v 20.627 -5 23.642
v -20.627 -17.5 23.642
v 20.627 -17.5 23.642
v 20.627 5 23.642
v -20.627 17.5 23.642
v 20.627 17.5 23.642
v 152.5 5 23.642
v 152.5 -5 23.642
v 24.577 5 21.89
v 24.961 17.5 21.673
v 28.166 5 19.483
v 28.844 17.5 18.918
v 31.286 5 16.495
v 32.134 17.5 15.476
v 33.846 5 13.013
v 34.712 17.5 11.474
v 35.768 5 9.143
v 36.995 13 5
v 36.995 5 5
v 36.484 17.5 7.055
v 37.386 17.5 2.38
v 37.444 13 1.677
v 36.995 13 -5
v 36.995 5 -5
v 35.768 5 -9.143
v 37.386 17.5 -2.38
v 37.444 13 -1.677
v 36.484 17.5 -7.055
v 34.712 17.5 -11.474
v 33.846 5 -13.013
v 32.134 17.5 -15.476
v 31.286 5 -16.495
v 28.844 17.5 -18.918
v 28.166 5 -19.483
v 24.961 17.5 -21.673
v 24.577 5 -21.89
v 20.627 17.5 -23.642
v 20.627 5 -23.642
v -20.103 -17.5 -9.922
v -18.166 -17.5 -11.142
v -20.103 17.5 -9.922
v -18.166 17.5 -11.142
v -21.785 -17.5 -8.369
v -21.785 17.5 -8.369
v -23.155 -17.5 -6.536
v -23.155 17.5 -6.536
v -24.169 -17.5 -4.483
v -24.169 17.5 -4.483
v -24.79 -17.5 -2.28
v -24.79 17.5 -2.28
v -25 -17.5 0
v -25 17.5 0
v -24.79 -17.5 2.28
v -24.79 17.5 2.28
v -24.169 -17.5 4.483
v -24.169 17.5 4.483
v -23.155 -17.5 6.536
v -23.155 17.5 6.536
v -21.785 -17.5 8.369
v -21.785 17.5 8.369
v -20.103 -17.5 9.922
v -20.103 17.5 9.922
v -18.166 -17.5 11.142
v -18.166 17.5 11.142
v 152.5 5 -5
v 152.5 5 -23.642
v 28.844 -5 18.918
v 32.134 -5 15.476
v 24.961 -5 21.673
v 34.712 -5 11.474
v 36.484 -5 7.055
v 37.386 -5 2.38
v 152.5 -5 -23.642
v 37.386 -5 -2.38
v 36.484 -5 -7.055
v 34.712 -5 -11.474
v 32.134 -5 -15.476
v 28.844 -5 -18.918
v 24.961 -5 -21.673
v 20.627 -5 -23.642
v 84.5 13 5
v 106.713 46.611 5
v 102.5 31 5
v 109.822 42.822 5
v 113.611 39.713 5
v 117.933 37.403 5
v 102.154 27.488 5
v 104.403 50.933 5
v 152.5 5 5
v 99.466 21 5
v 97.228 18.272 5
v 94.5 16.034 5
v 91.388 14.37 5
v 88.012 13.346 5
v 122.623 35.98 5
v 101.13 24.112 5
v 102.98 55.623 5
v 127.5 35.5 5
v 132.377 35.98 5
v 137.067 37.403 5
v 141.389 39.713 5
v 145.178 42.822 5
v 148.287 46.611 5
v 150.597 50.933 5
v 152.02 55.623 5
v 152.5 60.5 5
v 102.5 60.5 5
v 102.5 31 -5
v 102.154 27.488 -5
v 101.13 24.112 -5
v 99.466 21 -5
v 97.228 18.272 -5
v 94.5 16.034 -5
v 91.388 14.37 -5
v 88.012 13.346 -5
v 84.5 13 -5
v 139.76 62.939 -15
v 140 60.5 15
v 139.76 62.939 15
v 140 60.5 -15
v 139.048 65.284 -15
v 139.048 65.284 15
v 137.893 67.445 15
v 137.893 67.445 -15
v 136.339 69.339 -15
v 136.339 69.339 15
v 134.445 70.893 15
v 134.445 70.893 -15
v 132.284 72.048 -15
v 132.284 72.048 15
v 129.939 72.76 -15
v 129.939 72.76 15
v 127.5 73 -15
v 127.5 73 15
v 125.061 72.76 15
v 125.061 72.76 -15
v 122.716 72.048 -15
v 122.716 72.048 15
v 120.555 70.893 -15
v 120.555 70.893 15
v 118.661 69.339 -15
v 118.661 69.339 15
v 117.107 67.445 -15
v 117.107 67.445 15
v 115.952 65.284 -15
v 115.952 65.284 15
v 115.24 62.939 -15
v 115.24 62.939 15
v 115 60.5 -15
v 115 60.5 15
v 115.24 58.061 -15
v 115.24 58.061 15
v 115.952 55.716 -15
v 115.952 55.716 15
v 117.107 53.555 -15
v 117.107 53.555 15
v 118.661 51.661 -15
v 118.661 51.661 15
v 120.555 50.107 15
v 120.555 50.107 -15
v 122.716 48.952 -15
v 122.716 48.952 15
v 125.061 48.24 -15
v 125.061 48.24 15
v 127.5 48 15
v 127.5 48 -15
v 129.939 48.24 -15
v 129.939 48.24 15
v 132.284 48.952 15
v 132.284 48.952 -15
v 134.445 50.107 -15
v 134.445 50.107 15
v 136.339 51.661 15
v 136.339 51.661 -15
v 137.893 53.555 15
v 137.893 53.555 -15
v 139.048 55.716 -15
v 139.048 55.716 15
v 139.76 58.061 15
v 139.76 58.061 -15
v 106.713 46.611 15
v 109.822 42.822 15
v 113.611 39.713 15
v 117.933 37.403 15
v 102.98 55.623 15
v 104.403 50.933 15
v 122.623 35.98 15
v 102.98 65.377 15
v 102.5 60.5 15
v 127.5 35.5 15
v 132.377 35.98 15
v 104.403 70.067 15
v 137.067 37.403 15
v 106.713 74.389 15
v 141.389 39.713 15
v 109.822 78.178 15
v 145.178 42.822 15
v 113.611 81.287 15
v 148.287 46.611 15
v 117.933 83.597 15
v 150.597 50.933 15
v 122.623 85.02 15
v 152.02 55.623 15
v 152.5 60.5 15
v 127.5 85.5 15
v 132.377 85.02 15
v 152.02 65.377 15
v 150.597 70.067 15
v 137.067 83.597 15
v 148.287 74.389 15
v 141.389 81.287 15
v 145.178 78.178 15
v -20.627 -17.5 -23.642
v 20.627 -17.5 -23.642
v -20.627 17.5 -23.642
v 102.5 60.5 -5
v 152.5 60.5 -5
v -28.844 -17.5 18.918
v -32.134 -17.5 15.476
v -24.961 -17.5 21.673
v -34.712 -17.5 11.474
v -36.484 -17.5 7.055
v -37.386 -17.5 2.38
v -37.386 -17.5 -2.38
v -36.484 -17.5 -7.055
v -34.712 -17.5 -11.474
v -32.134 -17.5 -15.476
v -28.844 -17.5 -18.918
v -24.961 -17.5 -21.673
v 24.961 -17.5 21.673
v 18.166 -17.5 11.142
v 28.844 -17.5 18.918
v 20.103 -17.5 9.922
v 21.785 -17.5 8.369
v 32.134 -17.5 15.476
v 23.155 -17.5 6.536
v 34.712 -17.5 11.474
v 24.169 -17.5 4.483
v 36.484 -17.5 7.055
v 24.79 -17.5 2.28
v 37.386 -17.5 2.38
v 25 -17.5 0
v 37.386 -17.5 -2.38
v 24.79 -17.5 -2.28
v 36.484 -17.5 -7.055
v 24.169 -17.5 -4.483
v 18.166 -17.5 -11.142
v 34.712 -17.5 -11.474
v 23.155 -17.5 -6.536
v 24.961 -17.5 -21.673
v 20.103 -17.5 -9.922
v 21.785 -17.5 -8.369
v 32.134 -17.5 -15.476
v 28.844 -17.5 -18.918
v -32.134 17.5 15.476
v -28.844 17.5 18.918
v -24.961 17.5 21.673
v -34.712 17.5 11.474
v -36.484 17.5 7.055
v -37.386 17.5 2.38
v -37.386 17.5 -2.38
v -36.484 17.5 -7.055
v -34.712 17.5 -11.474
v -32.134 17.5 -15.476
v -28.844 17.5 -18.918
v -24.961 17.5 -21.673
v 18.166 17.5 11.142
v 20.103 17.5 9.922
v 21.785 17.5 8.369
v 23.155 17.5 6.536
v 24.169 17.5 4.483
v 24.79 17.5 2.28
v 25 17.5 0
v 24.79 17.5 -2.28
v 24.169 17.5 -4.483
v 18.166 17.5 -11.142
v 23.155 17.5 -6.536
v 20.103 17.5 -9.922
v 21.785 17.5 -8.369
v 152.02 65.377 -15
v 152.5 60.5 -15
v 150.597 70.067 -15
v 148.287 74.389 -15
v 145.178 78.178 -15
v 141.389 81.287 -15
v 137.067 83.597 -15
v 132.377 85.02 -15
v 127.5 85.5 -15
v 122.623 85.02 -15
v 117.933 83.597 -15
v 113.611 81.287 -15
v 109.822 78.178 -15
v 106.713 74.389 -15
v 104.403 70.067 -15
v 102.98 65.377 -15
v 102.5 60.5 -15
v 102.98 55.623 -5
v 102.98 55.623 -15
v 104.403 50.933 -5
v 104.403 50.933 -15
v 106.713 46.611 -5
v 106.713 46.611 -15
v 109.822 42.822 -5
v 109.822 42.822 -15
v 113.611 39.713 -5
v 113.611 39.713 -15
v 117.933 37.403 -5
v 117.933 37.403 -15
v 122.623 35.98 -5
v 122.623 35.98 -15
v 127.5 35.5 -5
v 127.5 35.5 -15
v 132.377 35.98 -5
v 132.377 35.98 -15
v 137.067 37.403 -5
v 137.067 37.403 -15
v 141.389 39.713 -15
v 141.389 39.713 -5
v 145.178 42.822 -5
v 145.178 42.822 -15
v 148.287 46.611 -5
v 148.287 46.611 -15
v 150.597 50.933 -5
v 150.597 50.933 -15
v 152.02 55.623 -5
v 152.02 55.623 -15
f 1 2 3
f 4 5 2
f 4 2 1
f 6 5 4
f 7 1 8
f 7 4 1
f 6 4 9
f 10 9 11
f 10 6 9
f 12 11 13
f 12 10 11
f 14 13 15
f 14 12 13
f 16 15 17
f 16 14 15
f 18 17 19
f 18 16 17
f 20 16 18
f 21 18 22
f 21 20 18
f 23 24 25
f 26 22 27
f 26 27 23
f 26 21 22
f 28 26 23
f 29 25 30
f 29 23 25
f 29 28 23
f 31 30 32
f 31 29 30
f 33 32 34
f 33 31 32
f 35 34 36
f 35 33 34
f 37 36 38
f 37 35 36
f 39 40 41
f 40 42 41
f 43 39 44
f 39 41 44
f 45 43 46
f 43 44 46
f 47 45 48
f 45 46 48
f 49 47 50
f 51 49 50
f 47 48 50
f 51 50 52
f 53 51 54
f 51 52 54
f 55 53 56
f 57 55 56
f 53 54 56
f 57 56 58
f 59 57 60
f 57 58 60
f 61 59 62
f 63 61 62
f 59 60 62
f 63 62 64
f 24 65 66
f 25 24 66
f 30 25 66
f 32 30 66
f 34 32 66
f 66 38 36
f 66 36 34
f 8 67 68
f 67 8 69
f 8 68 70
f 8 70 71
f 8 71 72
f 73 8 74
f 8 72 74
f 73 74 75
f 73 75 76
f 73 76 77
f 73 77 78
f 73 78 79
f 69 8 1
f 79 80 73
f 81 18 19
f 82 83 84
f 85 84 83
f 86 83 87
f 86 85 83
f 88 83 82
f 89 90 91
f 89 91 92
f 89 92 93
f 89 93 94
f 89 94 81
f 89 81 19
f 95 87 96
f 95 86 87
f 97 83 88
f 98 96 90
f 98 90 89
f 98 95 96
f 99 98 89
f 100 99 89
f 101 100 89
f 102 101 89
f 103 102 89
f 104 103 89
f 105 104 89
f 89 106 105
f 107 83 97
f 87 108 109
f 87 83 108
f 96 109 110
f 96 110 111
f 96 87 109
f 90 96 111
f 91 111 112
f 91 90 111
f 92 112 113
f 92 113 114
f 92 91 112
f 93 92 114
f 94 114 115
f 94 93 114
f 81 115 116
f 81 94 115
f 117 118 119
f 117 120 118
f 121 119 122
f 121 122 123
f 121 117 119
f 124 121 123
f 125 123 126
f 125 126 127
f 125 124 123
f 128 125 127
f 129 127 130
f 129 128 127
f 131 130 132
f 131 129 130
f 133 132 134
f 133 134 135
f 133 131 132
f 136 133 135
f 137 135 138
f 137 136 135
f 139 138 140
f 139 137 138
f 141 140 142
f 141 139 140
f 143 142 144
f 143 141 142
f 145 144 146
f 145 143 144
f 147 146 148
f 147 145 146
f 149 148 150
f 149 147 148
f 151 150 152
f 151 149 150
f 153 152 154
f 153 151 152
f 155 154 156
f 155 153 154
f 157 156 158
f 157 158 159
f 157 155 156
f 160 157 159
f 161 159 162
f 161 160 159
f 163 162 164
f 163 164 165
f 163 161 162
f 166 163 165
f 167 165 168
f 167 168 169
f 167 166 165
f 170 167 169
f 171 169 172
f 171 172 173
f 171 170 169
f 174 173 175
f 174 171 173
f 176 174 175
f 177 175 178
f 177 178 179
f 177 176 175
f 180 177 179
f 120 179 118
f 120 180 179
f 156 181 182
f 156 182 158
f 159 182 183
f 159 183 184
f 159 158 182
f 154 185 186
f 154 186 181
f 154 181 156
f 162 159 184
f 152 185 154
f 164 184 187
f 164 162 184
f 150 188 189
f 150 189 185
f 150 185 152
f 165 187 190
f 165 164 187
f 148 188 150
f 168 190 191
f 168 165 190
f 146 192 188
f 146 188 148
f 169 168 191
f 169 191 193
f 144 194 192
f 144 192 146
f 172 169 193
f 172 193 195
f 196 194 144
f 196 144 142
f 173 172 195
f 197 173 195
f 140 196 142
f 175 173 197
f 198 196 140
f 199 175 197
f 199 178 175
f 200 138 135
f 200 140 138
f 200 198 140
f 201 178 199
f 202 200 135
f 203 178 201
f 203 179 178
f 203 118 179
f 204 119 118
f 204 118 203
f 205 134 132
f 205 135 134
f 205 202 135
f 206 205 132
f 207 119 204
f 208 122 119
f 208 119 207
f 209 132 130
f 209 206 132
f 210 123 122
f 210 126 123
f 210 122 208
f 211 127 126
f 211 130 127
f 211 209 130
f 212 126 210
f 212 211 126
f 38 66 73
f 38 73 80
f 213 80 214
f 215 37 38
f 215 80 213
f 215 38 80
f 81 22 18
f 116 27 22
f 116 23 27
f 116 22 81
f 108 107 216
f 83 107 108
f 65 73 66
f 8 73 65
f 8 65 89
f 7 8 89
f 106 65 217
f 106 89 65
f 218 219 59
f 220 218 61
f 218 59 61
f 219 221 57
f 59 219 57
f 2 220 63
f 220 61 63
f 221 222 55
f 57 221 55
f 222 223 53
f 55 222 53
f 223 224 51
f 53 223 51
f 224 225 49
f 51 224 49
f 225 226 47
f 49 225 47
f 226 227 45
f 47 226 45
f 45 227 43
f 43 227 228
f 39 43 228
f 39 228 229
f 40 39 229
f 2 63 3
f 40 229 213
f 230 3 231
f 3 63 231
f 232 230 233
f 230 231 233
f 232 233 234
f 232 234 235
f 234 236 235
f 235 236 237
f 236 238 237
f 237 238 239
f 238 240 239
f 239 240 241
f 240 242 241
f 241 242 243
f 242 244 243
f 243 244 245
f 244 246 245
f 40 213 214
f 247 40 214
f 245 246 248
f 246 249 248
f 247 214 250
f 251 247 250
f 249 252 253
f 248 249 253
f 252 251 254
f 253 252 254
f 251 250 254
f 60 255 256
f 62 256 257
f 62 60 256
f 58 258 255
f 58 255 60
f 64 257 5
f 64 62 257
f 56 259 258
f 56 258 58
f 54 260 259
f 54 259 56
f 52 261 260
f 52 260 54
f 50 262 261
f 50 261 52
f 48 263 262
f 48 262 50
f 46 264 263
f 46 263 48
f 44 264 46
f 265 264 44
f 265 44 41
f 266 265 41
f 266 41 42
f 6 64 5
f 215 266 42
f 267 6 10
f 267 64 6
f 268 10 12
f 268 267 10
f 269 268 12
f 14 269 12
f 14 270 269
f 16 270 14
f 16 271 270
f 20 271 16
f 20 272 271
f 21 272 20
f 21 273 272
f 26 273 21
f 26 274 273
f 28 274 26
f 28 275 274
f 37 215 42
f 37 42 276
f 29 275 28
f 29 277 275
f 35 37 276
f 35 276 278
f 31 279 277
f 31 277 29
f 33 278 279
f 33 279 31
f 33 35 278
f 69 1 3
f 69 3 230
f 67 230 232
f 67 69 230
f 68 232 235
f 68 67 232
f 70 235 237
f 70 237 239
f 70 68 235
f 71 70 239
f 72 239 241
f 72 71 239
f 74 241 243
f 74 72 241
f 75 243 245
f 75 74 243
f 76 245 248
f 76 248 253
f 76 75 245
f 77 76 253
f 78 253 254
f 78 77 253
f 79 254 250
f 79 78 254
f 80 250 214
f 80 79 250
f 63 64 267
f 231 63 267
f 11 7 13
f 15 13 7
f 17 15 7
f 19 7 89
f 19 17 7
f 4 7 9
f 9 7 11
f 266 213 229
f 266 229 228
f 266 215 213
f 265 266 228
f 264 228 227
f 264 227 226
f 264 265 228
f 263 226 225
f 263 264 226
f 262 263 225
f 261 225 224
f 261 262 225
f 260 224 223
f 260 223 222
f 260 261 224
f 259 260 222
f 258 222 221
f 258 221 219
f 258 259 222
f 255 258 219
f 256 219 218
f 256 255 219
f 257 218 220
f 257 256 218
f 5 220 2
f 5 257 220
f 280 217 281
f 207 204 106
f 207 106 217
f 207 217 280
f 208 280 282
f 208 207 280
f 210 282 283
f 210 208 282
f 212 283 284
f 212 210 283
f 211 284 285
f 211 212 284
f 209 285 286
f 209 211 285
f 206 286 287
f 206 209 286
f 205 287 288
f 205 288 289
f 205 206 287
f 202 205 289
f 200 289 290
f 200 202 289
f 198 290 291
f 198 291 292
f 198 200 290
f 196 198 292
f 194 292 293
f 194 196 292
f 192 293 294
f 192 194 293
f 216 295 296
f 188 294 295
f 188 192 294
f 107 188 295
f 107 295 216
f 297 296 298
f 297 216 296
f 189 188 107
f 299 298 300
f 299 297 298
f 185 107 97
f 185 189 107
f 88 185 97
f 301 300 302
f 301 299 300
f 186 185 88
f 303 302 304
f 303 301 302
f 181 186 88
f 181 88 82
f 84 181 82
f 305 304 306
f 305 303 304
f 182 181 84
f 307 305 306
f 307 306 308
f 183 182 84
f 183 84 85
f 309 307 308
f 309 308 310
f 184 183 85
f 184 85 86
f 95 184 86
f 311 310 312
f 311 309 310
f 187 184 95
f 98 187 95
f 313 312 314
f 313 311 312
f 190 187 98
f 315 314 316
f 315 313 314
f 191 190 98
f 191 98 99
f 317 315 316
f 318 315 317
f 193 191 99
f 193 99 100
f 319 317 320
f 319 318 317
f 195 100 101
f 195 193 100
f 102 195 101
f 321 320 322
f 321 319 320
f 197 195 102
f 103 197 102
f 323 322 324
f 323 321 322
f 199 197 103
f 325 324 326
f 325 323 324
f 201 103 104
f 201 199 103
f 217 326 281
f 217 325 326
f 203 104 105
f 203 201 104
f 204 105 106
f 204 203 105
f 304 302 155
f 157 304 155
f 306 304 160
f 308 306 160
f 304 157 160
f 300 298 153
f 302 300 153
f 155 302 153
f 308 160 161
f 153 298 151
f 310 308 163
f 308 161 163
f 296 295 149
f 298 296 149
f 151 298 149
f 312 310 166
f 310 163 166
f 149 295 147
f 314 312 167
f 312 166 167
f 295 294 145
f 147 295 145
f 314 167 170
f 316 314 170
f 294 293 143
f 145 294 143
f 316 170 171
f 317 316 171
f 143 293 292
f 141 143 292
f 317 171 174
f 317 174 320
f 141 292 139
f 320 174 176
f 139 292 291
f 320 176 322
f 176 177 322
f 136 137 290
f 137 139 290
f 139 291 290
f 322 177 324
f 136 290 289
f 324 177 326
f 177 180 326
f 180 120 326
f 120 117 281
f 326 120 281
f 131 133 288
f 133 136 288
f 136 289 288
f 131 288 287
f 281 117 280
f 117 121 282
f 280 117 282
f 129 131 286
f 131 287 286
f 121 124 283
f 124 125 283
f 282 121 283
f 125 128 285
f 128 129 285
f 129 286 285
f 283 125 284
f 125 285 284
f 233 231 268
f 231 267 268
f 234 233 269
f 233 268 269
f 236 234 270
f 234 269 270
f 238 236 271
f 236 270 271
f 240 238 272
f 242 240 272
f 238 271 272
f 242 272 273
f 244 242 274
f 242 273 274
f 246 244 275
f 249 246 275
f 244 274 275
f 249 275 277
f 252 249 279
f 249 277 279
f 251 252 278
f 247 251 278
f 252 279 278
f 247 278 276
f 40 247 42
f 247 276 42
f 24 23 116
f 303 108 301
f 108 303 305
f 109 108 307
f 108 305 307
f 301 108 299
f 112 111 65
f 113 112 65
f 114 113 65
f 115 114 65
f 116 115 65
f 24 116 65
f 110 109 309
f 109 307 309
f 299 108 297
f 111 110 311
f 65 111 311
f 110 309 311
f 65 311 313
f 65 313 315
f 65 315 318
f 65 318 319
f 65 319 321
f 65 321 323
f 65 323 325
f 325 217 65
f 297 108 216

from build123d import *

# Parameters (mm, degrees)
BOSS_EXTRUDE1_DEPTH = 17.5
SKETCH3_W           = 47.284329966
SKETCH3_H           = 10
BOSS_EXTRUDE2_DEPTH = 152.5
CUT_EXTRUDE1_DEPTH  = 152.5
SKETCH5_R           = 25
SKETCH5_R_2         = 12.5
BOSS_EXTRUDE3_DEPTH = 15
BOSS_EXTRUDE4_DEPTH = 5
RIB1_REACH          = 178.424
SKETCH7_WALL_W      = 419.848137108
SKETCH7_WALL_H      = 10
FILLET1_R           = 18


with BuildPart() as part:
    # Sketch2 → Boss-Extrude1 (new, symmetric)
    with BuildSketch(Plane(origin=(0, 0, 0), x_dir=(1, 0, 0), z_dir=(0, 1, 0))):
        with BuildLine():
            Line((-20.626994213, -23.642164983), (20.626994213, -23.642164983))
            ThreePointArc((20.626994213, -23.642164983), (37.5, 0), (20.626994213, 23.642164983))
            Line((20.626994213, 23.642164983), (-20.626994213, 23.642164983))
            ThreePointArc((-20.626994213, 23.642164983), (-37.5, 0), (-20.626994213, -23.642164983))
        make_face()
        with BuildLine():
            Line((-18.165876764, -11.142164983), (18.165876764, -11.142164983))
            ThreePointArc((18.165876764, -11.142164983), (25, 0), (18.165876764, 11.142164983))
            Line((18.165876764, 11.142164983), (-18.165876764, 11.142164983))
            ThreePointArc((-18.165876764, 11.142164983), (-25, 0), (-18.165876764, -11.142164983))
        make_face(mode=Mode.SUBTRACT)
    extrude(amount=BOSS_EXTRUDE1_DEPTH, both=True)

    # Sketch3 → Boss-Extrude2 (add)
    with BuildSketch(Plane(origin=(0, 0, 0), x_dir=(0, 0, -1), z_dir=(1, 0, 0))):
        Rectangle(SKETCH3_W, SKETCH3_H)
    extrude(amount=BOSS_EXTRUDE2_DEPTH)

    # Sketch4 → Cut-Extrude1 (cut)
    with BuildSketch(Plane(origin=(0, 17.5, 0), x_dir=(1, 0, 0), z_dir=(0, 1, 0))):
        with BuildLine():
            Line((-18.165876764, -11.142164983), (18.165876764, -11.142164983))
            ThreePointArc((18.165876764, -11.142164983), (25, 0), (18.165876764, 11.142164983))
            Line((18.165876764, 11.142164983), (-18.165876764, 11.142164983))
            ThreePointArc((-18.165876764, 11.142164983), (-25, 0), (-18.165876764, -11.142164983))
        make_face()
    extrude(amount=-CUT_EXTRUDE1_DEPTH, mode=Mode.SUBTRACT)



with BuildPart() as body_2:
    # Sketch5 → Boss-Extrude3 (new, symmetric)
    with BuildSketch(Plane.XY):
        with Locations((127.5, 60.5)):
            Circle(SKETCH5_R)
        with Locations((127.5, 60.5)):
            Circle(SKETCH5_R_2, mode=Mode.SUBTRACT)
    extrude(amount=BOSS_EXTRUDE3_DEPTH, both=True)


with BuildPart() as part_1:
    add(part.part)

    add(body_2.part)  # Boss-Extrude4 merges body 2
    # Sketch6 → Boss-Extrude4 (add, symmetric)
    with BuildSketch(Plane.XY):
        with BuildLine():
            Line((102.5, 60.5), (102.5, 0))
            Line((102.5, 0), (152.5, 0))
            Line((152.5, 0), (152.5, 60.5))
            ThreePointArc((152.5, 60.5), (127.5, 35.5), (102.5, 60.5))
        make_face()
    extrude(amount=BOSS_EXTRUDE4_DEPTH, both=True)

    # Sketch7 wall → Rib1 (add, up to next)
    with BuildSketch(Plane(origin=(70, 13, 0), x_dir=(1, 0, 0), z_dir=(0, 1, 0)), mode=Mode.PRIVATE) as rib1_sk1:
        Rectangle(SKETCH7_WALL_W, SKETCH7_WALL_H)
    rib1_tool1 = extrude(rib1_sk1.sketch, amount=-RIB1_REACH, mode=Mode.PRIVATE) - part_1.part
    add(rib1_tool1.solids().sort_by_distance((70, 13, 0))[0])

    # Fillet1
    fillet1_edges = [part_1.edges().sort_by_distance(p)[0] for p in [
        (102.5, 13, 0),
    ]]
    fillet(fillet1_edges, radius=FILLET1_R)


solid = part_1.part
